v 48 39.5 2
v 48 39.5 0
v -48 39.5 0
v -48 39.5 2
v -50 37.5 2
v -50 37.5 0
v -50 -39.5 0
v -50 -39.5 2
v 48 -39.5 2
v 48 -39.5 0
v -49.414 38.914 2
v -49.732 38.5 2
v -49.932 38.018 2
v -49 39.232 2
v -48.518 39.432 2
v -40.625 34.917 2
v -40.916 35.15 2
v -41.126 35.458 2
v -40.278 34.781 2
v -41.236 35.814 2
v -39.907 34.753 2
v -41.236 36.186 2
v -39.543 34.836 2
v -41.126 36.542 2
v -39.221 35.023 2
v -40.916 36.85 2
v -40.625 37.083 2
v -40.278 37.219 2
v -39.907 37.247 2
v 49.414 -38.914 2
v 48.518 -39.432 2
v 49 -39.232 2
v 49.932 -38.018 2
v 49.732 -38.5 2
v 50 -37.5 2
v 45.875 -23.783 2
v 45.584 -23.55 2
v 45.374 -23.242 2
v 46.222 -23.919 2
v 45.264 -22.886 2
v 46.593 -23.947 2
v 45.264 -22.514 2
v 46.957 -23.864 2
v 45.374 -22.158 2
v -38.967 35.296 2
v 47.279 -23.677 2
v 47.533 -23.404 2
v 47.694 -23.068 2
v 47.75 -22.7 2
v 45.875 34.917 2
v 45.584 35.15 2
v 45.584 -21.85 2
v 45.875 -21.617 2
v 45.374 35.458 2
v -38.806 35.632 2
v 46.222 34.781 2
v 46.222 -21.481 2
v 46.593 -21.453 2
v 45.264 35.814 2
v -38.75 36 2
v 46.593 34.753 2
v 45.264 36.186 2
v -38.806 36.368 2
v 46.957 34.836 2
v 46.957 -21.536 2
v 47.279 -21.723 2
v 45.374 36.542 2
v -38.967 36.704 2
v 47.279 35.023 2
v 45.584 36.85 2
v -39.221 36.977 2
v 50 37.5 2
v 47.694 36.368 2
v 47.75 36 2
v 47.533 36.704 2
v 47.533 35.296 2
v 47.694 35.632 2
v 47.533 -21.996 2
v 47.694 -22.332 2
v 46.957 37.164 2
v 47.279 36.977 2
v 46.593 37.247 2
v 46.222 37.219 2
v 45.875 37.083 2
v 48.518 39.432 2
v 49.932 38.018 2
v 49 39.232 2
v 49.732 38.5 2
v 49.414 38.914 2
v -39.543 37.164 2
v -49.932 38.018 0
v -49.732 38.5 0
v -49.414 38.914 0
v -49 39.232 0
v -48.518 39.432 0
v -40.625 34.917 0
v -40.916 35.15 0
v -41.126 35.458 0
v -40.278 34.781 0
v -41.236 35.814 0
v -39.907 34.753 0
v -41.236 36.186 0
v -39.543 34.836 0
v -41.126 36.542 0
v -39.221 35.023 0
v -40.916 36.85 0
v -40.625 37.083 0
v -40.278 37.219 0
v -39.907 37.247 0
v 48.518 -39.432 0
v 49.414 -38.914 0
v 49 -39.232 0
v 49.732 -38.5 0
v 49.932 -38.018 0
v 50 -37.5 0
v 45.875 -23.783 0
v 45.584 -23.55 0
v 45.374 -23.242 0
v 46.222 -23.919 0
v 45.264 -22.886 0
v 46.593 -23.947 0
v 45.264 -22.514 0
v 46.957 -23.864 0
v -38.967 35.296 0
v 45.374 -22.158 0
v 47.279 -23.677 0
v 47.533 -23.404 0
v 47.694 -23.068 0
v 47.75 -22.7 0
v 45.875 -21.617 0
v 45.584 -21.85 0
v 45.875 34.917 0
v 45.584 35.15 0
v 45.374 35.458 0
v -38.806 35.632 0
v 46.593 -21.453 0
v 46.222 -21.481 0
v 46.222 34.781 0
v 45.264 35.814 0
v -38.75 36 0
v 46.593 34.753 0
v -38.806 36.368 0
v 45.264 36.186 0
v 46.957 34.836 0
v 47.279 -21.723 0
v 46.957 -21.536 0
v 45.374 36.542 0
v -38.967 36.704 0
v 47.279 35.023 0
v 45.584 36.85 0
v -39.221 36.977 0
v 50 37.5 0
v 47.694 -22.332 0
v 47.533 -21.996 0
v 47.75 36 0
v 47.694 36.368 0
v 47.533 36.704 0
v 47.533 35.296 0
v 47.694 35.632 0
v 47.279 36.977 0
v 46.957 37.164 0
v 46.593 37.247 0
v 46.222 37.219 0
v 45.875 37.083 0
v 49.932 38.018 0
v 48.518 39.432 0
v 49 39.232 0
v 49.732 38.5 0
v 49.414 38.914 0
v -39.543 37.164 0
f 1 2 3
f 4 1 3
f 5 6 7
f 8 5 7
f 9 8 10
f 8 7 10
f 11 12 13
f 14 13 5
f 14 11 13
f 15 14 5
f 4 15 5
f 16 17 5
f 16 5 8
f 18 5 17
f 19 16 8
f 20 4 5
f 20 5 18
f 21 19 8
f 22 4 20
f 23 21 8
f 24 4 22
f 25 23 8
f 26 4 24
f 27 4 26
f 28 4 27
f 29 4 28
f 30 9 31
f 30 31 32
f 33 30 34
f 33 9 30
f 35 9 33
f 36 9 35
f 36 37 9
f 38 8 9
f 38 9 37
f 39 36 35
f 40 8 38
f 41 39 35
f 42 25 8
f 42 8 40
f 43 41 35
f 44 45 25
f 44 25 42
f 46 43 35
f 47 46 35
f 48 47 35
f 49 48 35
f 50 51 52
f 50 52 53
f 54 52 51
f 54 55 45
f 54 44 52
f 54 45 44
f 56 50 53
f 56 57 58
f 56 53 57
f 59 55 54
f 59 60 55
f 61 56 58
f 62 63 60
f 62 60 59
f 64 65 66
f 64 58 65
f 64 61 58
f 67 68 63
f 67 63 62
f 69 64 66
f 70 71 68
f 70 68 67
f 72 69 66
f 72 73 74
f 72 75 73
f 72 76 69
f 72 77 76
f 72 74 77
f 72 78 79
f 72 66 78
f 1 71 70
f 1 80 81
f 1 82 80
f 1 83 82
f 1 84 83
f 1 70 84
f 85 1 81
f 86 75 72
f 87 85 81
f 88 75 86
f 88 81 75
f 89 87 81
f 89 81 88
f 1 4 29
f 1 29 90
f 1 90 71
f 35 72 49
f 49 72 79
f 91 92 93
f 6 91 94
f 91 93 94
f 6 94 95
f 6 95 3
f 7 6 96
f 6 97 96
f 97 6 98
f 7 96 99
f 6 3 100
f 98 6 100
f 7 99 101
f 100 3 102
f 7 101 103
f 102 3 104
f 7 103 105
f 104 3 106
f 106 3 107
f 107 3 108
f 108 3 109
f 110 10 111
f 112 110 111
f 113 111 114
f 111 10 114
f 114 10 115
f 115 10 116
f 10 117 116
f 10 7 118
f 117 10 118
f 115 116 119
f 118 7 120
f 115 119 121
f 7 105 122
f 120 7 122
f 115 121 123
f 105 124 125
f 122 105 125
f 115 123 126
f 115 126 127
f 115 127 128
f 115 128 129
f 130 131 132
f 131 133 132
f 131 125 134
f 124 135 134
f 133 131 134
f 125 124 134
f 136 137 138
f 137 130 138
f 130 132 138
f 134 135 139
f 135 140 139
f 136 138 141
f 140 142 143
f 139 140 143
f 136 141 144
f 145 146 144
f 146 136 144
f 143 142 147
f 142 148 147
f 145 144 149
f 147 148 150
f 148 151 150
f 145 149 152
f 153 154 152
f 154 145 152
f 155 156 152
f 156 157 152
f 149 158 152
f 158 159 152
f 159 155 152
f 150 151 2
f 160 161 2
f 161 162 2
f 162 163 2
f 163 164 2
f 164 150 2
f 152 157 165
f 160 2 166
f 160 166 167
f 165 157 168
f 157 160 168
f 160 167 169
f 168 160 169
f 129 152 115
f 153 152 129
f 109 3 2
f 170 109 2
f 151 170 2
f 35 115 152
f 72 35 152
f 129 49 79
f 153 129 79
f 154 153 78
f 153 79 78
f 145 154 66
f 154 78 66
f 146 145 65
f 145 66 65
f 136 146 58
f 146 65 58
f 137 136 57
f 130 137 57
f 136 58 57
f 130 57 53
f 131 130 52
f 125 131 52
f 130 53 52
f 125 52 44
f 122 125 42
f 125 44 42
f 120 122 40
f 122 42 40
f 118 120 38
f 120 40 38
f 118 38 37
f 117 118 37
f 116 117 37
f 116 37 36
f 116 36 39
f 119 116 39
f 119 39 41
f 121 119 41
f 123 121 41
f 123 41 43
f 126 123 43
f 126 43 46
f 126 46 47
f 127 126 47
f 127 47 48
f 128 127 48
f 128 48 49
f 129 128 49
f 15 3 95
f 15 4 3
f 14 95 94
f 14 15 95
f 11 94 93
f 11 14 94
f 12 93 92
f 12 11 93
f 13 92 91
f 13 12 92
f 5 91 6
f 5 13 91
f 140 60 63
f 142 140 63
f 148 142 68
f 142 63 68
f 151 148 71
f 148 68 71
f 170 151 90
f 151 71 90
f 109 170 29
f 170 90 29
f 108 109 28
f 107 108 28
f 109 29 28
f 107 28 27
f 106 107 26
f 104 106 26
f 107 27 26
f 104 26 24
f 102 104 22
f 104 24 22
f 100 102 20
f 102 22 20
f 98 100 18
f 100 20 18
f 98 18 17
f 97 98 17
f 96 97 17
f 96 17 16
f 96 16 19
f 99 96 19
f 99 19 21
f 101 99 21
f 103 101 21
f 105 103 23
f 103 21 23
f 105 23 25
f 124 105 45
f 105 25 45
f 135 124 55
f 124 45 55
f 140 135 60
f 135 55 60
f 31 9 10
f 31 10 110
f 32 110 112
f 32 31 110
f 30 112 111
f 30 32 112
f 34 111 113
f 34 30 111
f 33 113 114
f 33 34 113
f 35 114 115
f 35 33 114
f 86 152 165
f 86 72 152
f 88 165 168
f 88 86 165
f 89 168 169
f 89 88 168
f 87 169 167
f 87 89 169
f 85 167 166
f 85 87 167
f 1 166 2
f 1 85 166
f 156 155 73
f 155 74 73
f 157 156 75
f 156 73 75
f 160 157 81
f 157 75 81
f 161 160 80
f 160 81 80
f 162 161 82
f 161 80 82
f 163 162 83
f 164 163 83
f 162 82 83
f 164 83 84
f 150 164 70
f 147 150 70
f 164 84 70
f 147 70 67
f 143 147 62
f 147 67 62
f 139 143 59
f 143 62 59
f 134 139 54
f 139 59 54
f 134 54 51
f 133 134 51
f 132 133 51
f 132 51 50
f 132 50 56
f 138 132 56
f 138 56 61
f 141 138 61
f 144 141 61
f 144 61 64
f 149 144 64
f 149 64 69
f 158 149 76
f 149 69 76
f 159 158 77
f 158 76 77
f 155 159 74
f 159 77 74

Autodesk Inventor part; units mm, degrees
ref_plane "YZ Plane" through (0, 0, 0) normal (1, 0, 0) x (0, 1, 0)
ref_plane "XZ Plane" through (0, 0, 0) normal (0, 1, 0) x (-1, 0, 0)
ref_plane "XY Plane" through (0, 0, 0) normal (0, 0, 1) x (1, 0, 0)
sketch "Sketch1" plane through (0, 0, 0) normal (0, 0, 1) x (1, 0, 0)
  line L0 (-50, -39.5) -> (50, -39.5)
  line L1 (50, -39.5) -> (50, 39.5)
  line L2 (50, 39.5) -> (-50, 39.5)
  line L3 (-50, 39.5) -> (-50, -39.5)
  line L4 (-50, -39.5) -> (50, 39.5) construction
  line L5 (50, -39.5) -> (-50, 39.5) construction
  point P0 (0, 0)
  dimension "d0" = 100
  dimension "d1" = 79
extrude "Extrusion1" add sketch "Sketch1" along normal blind 2
sketch "Sketch3" plane through (0, 0, 2) normal (0, 0, 1) x (1, 0, 0)
  circle A0 centre (-40, 36) radius 1.25
  circle A1 centre (46.5, 36) radius 1.25
  circle A2 centre (46.5, -22.7) radius 1.25
  line L0 (-50, 39.5) -> (-50, -39.5) projected
  line L1 (50, 39.5) -> (-50, 39.5) projected
  line L2 (50, -39.5) -> (50, 39.5) projected
  line L3 (-50, -39.5) -> (50, -39.5) projected
  point P0 (0, 0)
  dimension "d6" = 2.5
  dimension "d7" = 2.5
  dimension "d8" = 2.5
  dimension "d9" = 10
  dimension "d10" = 3.5
  dimension "d11" = 3.5
  dimension "d12" = 3.5
  dimension "d13" = 3.5
  dimension "d14" = 16.8
extrude "Extrusion2" cut sketch "Sketch3" against normal blind 2 contours A0 | A1 | A2
fillet "Fillet1" radius 2 3 edges at (50, -39.5, 1) (50, 39.5, 1) (-50, 39.5, 1)
sketch "Sketch4" plane through (0, 0, 2) normal (0, 0, 1) x (1, 0, 0)
  arc A0 (-48, 39.5) -> (-50, 37.5) centre (-48, 37.5) ccw projected
  line L0 (-50, 37.5) -> (-50, -39.5) projected
  line L1 (-50, -39.5) -> (48, -39.5) projected
  arc A1 (48, -39.5) -> (50, -37.5) centre (48, -37.5) ccw projected
  line L2 (50, -37.5) -> (50, 37.5) projected
  arc A2 (50, 37.5) -> (48, 39.5) centre (48, 37.5) ccw projected
  line L3 (48, 39.5) -> (-48, 39.5) projected
  circle A3 centre (-40, 36) radius 1.25 projected
  circle A4 centre (46.5, 36) radius 1.25 projected
  circle A5 centre (46.5, -22.7) radius 1.25 projected
  line L4 (-50, -39.5) -> (48, -39.5) projected
  line L5 (48, 39.5) -> (-48, 39.5) projected
  line L6 (-40, -39.5) -> (40, -39.5)
  line L7 (40, -39.5) -> (40, 39.5)
  line L8 (40, 39.5) -> (-40, 39.5)
  line L9 (-40, 39.5) -> (-40, -39.5)
  point P0 (0, 0)
  dimension "d18" = 10
  dimension "d19" = 10
equation "\"d7\" = d6"
equation "\"d8\" = d6"
equation "\"d11\" = d10"
equation "\"d12\" = d11"
equation "\"d13\" = d12"
equation "\"d19\" = d18"
properties part number "NanoHolder"
